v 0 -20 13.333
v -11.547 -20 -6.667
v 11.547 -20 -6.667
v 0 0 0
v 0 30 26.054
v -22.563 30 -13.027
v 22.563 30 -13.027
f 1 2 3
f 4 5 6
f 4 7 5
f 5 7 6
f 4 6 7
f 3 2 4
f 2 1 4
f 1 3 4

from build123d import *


with BuildPart() as f5:
    # F2 (on offset) → F5 section 0
    with BuildSketch(Plane.XZ.offset(20), mode=Mode.PRIVATE) as f5_s0:
        Polygon((-11.5470053838, -6.6666666667), (11.5470053838, -6.6666666667), (0, 13.3333333333), align=None)
    loft([f5_s0.sketch, Vertex(0, 0, 0)])


with BuildPart() as f6:
    # F4 (on offset) → F6 section 0
    with BuildSketch(Plane.XZ.offset(-30), mode=Mode.PRIVATE) as f6_s0:
        Polygon((22.5633149838, -13.0269359797), (0, 26.0538719594), (-22.5633149838, -13.0269359797), align=None)
    loft([f6_s0.sketch, Vertex(0, 0, 0)])


solid = Compound([f5.part, f6.part])
